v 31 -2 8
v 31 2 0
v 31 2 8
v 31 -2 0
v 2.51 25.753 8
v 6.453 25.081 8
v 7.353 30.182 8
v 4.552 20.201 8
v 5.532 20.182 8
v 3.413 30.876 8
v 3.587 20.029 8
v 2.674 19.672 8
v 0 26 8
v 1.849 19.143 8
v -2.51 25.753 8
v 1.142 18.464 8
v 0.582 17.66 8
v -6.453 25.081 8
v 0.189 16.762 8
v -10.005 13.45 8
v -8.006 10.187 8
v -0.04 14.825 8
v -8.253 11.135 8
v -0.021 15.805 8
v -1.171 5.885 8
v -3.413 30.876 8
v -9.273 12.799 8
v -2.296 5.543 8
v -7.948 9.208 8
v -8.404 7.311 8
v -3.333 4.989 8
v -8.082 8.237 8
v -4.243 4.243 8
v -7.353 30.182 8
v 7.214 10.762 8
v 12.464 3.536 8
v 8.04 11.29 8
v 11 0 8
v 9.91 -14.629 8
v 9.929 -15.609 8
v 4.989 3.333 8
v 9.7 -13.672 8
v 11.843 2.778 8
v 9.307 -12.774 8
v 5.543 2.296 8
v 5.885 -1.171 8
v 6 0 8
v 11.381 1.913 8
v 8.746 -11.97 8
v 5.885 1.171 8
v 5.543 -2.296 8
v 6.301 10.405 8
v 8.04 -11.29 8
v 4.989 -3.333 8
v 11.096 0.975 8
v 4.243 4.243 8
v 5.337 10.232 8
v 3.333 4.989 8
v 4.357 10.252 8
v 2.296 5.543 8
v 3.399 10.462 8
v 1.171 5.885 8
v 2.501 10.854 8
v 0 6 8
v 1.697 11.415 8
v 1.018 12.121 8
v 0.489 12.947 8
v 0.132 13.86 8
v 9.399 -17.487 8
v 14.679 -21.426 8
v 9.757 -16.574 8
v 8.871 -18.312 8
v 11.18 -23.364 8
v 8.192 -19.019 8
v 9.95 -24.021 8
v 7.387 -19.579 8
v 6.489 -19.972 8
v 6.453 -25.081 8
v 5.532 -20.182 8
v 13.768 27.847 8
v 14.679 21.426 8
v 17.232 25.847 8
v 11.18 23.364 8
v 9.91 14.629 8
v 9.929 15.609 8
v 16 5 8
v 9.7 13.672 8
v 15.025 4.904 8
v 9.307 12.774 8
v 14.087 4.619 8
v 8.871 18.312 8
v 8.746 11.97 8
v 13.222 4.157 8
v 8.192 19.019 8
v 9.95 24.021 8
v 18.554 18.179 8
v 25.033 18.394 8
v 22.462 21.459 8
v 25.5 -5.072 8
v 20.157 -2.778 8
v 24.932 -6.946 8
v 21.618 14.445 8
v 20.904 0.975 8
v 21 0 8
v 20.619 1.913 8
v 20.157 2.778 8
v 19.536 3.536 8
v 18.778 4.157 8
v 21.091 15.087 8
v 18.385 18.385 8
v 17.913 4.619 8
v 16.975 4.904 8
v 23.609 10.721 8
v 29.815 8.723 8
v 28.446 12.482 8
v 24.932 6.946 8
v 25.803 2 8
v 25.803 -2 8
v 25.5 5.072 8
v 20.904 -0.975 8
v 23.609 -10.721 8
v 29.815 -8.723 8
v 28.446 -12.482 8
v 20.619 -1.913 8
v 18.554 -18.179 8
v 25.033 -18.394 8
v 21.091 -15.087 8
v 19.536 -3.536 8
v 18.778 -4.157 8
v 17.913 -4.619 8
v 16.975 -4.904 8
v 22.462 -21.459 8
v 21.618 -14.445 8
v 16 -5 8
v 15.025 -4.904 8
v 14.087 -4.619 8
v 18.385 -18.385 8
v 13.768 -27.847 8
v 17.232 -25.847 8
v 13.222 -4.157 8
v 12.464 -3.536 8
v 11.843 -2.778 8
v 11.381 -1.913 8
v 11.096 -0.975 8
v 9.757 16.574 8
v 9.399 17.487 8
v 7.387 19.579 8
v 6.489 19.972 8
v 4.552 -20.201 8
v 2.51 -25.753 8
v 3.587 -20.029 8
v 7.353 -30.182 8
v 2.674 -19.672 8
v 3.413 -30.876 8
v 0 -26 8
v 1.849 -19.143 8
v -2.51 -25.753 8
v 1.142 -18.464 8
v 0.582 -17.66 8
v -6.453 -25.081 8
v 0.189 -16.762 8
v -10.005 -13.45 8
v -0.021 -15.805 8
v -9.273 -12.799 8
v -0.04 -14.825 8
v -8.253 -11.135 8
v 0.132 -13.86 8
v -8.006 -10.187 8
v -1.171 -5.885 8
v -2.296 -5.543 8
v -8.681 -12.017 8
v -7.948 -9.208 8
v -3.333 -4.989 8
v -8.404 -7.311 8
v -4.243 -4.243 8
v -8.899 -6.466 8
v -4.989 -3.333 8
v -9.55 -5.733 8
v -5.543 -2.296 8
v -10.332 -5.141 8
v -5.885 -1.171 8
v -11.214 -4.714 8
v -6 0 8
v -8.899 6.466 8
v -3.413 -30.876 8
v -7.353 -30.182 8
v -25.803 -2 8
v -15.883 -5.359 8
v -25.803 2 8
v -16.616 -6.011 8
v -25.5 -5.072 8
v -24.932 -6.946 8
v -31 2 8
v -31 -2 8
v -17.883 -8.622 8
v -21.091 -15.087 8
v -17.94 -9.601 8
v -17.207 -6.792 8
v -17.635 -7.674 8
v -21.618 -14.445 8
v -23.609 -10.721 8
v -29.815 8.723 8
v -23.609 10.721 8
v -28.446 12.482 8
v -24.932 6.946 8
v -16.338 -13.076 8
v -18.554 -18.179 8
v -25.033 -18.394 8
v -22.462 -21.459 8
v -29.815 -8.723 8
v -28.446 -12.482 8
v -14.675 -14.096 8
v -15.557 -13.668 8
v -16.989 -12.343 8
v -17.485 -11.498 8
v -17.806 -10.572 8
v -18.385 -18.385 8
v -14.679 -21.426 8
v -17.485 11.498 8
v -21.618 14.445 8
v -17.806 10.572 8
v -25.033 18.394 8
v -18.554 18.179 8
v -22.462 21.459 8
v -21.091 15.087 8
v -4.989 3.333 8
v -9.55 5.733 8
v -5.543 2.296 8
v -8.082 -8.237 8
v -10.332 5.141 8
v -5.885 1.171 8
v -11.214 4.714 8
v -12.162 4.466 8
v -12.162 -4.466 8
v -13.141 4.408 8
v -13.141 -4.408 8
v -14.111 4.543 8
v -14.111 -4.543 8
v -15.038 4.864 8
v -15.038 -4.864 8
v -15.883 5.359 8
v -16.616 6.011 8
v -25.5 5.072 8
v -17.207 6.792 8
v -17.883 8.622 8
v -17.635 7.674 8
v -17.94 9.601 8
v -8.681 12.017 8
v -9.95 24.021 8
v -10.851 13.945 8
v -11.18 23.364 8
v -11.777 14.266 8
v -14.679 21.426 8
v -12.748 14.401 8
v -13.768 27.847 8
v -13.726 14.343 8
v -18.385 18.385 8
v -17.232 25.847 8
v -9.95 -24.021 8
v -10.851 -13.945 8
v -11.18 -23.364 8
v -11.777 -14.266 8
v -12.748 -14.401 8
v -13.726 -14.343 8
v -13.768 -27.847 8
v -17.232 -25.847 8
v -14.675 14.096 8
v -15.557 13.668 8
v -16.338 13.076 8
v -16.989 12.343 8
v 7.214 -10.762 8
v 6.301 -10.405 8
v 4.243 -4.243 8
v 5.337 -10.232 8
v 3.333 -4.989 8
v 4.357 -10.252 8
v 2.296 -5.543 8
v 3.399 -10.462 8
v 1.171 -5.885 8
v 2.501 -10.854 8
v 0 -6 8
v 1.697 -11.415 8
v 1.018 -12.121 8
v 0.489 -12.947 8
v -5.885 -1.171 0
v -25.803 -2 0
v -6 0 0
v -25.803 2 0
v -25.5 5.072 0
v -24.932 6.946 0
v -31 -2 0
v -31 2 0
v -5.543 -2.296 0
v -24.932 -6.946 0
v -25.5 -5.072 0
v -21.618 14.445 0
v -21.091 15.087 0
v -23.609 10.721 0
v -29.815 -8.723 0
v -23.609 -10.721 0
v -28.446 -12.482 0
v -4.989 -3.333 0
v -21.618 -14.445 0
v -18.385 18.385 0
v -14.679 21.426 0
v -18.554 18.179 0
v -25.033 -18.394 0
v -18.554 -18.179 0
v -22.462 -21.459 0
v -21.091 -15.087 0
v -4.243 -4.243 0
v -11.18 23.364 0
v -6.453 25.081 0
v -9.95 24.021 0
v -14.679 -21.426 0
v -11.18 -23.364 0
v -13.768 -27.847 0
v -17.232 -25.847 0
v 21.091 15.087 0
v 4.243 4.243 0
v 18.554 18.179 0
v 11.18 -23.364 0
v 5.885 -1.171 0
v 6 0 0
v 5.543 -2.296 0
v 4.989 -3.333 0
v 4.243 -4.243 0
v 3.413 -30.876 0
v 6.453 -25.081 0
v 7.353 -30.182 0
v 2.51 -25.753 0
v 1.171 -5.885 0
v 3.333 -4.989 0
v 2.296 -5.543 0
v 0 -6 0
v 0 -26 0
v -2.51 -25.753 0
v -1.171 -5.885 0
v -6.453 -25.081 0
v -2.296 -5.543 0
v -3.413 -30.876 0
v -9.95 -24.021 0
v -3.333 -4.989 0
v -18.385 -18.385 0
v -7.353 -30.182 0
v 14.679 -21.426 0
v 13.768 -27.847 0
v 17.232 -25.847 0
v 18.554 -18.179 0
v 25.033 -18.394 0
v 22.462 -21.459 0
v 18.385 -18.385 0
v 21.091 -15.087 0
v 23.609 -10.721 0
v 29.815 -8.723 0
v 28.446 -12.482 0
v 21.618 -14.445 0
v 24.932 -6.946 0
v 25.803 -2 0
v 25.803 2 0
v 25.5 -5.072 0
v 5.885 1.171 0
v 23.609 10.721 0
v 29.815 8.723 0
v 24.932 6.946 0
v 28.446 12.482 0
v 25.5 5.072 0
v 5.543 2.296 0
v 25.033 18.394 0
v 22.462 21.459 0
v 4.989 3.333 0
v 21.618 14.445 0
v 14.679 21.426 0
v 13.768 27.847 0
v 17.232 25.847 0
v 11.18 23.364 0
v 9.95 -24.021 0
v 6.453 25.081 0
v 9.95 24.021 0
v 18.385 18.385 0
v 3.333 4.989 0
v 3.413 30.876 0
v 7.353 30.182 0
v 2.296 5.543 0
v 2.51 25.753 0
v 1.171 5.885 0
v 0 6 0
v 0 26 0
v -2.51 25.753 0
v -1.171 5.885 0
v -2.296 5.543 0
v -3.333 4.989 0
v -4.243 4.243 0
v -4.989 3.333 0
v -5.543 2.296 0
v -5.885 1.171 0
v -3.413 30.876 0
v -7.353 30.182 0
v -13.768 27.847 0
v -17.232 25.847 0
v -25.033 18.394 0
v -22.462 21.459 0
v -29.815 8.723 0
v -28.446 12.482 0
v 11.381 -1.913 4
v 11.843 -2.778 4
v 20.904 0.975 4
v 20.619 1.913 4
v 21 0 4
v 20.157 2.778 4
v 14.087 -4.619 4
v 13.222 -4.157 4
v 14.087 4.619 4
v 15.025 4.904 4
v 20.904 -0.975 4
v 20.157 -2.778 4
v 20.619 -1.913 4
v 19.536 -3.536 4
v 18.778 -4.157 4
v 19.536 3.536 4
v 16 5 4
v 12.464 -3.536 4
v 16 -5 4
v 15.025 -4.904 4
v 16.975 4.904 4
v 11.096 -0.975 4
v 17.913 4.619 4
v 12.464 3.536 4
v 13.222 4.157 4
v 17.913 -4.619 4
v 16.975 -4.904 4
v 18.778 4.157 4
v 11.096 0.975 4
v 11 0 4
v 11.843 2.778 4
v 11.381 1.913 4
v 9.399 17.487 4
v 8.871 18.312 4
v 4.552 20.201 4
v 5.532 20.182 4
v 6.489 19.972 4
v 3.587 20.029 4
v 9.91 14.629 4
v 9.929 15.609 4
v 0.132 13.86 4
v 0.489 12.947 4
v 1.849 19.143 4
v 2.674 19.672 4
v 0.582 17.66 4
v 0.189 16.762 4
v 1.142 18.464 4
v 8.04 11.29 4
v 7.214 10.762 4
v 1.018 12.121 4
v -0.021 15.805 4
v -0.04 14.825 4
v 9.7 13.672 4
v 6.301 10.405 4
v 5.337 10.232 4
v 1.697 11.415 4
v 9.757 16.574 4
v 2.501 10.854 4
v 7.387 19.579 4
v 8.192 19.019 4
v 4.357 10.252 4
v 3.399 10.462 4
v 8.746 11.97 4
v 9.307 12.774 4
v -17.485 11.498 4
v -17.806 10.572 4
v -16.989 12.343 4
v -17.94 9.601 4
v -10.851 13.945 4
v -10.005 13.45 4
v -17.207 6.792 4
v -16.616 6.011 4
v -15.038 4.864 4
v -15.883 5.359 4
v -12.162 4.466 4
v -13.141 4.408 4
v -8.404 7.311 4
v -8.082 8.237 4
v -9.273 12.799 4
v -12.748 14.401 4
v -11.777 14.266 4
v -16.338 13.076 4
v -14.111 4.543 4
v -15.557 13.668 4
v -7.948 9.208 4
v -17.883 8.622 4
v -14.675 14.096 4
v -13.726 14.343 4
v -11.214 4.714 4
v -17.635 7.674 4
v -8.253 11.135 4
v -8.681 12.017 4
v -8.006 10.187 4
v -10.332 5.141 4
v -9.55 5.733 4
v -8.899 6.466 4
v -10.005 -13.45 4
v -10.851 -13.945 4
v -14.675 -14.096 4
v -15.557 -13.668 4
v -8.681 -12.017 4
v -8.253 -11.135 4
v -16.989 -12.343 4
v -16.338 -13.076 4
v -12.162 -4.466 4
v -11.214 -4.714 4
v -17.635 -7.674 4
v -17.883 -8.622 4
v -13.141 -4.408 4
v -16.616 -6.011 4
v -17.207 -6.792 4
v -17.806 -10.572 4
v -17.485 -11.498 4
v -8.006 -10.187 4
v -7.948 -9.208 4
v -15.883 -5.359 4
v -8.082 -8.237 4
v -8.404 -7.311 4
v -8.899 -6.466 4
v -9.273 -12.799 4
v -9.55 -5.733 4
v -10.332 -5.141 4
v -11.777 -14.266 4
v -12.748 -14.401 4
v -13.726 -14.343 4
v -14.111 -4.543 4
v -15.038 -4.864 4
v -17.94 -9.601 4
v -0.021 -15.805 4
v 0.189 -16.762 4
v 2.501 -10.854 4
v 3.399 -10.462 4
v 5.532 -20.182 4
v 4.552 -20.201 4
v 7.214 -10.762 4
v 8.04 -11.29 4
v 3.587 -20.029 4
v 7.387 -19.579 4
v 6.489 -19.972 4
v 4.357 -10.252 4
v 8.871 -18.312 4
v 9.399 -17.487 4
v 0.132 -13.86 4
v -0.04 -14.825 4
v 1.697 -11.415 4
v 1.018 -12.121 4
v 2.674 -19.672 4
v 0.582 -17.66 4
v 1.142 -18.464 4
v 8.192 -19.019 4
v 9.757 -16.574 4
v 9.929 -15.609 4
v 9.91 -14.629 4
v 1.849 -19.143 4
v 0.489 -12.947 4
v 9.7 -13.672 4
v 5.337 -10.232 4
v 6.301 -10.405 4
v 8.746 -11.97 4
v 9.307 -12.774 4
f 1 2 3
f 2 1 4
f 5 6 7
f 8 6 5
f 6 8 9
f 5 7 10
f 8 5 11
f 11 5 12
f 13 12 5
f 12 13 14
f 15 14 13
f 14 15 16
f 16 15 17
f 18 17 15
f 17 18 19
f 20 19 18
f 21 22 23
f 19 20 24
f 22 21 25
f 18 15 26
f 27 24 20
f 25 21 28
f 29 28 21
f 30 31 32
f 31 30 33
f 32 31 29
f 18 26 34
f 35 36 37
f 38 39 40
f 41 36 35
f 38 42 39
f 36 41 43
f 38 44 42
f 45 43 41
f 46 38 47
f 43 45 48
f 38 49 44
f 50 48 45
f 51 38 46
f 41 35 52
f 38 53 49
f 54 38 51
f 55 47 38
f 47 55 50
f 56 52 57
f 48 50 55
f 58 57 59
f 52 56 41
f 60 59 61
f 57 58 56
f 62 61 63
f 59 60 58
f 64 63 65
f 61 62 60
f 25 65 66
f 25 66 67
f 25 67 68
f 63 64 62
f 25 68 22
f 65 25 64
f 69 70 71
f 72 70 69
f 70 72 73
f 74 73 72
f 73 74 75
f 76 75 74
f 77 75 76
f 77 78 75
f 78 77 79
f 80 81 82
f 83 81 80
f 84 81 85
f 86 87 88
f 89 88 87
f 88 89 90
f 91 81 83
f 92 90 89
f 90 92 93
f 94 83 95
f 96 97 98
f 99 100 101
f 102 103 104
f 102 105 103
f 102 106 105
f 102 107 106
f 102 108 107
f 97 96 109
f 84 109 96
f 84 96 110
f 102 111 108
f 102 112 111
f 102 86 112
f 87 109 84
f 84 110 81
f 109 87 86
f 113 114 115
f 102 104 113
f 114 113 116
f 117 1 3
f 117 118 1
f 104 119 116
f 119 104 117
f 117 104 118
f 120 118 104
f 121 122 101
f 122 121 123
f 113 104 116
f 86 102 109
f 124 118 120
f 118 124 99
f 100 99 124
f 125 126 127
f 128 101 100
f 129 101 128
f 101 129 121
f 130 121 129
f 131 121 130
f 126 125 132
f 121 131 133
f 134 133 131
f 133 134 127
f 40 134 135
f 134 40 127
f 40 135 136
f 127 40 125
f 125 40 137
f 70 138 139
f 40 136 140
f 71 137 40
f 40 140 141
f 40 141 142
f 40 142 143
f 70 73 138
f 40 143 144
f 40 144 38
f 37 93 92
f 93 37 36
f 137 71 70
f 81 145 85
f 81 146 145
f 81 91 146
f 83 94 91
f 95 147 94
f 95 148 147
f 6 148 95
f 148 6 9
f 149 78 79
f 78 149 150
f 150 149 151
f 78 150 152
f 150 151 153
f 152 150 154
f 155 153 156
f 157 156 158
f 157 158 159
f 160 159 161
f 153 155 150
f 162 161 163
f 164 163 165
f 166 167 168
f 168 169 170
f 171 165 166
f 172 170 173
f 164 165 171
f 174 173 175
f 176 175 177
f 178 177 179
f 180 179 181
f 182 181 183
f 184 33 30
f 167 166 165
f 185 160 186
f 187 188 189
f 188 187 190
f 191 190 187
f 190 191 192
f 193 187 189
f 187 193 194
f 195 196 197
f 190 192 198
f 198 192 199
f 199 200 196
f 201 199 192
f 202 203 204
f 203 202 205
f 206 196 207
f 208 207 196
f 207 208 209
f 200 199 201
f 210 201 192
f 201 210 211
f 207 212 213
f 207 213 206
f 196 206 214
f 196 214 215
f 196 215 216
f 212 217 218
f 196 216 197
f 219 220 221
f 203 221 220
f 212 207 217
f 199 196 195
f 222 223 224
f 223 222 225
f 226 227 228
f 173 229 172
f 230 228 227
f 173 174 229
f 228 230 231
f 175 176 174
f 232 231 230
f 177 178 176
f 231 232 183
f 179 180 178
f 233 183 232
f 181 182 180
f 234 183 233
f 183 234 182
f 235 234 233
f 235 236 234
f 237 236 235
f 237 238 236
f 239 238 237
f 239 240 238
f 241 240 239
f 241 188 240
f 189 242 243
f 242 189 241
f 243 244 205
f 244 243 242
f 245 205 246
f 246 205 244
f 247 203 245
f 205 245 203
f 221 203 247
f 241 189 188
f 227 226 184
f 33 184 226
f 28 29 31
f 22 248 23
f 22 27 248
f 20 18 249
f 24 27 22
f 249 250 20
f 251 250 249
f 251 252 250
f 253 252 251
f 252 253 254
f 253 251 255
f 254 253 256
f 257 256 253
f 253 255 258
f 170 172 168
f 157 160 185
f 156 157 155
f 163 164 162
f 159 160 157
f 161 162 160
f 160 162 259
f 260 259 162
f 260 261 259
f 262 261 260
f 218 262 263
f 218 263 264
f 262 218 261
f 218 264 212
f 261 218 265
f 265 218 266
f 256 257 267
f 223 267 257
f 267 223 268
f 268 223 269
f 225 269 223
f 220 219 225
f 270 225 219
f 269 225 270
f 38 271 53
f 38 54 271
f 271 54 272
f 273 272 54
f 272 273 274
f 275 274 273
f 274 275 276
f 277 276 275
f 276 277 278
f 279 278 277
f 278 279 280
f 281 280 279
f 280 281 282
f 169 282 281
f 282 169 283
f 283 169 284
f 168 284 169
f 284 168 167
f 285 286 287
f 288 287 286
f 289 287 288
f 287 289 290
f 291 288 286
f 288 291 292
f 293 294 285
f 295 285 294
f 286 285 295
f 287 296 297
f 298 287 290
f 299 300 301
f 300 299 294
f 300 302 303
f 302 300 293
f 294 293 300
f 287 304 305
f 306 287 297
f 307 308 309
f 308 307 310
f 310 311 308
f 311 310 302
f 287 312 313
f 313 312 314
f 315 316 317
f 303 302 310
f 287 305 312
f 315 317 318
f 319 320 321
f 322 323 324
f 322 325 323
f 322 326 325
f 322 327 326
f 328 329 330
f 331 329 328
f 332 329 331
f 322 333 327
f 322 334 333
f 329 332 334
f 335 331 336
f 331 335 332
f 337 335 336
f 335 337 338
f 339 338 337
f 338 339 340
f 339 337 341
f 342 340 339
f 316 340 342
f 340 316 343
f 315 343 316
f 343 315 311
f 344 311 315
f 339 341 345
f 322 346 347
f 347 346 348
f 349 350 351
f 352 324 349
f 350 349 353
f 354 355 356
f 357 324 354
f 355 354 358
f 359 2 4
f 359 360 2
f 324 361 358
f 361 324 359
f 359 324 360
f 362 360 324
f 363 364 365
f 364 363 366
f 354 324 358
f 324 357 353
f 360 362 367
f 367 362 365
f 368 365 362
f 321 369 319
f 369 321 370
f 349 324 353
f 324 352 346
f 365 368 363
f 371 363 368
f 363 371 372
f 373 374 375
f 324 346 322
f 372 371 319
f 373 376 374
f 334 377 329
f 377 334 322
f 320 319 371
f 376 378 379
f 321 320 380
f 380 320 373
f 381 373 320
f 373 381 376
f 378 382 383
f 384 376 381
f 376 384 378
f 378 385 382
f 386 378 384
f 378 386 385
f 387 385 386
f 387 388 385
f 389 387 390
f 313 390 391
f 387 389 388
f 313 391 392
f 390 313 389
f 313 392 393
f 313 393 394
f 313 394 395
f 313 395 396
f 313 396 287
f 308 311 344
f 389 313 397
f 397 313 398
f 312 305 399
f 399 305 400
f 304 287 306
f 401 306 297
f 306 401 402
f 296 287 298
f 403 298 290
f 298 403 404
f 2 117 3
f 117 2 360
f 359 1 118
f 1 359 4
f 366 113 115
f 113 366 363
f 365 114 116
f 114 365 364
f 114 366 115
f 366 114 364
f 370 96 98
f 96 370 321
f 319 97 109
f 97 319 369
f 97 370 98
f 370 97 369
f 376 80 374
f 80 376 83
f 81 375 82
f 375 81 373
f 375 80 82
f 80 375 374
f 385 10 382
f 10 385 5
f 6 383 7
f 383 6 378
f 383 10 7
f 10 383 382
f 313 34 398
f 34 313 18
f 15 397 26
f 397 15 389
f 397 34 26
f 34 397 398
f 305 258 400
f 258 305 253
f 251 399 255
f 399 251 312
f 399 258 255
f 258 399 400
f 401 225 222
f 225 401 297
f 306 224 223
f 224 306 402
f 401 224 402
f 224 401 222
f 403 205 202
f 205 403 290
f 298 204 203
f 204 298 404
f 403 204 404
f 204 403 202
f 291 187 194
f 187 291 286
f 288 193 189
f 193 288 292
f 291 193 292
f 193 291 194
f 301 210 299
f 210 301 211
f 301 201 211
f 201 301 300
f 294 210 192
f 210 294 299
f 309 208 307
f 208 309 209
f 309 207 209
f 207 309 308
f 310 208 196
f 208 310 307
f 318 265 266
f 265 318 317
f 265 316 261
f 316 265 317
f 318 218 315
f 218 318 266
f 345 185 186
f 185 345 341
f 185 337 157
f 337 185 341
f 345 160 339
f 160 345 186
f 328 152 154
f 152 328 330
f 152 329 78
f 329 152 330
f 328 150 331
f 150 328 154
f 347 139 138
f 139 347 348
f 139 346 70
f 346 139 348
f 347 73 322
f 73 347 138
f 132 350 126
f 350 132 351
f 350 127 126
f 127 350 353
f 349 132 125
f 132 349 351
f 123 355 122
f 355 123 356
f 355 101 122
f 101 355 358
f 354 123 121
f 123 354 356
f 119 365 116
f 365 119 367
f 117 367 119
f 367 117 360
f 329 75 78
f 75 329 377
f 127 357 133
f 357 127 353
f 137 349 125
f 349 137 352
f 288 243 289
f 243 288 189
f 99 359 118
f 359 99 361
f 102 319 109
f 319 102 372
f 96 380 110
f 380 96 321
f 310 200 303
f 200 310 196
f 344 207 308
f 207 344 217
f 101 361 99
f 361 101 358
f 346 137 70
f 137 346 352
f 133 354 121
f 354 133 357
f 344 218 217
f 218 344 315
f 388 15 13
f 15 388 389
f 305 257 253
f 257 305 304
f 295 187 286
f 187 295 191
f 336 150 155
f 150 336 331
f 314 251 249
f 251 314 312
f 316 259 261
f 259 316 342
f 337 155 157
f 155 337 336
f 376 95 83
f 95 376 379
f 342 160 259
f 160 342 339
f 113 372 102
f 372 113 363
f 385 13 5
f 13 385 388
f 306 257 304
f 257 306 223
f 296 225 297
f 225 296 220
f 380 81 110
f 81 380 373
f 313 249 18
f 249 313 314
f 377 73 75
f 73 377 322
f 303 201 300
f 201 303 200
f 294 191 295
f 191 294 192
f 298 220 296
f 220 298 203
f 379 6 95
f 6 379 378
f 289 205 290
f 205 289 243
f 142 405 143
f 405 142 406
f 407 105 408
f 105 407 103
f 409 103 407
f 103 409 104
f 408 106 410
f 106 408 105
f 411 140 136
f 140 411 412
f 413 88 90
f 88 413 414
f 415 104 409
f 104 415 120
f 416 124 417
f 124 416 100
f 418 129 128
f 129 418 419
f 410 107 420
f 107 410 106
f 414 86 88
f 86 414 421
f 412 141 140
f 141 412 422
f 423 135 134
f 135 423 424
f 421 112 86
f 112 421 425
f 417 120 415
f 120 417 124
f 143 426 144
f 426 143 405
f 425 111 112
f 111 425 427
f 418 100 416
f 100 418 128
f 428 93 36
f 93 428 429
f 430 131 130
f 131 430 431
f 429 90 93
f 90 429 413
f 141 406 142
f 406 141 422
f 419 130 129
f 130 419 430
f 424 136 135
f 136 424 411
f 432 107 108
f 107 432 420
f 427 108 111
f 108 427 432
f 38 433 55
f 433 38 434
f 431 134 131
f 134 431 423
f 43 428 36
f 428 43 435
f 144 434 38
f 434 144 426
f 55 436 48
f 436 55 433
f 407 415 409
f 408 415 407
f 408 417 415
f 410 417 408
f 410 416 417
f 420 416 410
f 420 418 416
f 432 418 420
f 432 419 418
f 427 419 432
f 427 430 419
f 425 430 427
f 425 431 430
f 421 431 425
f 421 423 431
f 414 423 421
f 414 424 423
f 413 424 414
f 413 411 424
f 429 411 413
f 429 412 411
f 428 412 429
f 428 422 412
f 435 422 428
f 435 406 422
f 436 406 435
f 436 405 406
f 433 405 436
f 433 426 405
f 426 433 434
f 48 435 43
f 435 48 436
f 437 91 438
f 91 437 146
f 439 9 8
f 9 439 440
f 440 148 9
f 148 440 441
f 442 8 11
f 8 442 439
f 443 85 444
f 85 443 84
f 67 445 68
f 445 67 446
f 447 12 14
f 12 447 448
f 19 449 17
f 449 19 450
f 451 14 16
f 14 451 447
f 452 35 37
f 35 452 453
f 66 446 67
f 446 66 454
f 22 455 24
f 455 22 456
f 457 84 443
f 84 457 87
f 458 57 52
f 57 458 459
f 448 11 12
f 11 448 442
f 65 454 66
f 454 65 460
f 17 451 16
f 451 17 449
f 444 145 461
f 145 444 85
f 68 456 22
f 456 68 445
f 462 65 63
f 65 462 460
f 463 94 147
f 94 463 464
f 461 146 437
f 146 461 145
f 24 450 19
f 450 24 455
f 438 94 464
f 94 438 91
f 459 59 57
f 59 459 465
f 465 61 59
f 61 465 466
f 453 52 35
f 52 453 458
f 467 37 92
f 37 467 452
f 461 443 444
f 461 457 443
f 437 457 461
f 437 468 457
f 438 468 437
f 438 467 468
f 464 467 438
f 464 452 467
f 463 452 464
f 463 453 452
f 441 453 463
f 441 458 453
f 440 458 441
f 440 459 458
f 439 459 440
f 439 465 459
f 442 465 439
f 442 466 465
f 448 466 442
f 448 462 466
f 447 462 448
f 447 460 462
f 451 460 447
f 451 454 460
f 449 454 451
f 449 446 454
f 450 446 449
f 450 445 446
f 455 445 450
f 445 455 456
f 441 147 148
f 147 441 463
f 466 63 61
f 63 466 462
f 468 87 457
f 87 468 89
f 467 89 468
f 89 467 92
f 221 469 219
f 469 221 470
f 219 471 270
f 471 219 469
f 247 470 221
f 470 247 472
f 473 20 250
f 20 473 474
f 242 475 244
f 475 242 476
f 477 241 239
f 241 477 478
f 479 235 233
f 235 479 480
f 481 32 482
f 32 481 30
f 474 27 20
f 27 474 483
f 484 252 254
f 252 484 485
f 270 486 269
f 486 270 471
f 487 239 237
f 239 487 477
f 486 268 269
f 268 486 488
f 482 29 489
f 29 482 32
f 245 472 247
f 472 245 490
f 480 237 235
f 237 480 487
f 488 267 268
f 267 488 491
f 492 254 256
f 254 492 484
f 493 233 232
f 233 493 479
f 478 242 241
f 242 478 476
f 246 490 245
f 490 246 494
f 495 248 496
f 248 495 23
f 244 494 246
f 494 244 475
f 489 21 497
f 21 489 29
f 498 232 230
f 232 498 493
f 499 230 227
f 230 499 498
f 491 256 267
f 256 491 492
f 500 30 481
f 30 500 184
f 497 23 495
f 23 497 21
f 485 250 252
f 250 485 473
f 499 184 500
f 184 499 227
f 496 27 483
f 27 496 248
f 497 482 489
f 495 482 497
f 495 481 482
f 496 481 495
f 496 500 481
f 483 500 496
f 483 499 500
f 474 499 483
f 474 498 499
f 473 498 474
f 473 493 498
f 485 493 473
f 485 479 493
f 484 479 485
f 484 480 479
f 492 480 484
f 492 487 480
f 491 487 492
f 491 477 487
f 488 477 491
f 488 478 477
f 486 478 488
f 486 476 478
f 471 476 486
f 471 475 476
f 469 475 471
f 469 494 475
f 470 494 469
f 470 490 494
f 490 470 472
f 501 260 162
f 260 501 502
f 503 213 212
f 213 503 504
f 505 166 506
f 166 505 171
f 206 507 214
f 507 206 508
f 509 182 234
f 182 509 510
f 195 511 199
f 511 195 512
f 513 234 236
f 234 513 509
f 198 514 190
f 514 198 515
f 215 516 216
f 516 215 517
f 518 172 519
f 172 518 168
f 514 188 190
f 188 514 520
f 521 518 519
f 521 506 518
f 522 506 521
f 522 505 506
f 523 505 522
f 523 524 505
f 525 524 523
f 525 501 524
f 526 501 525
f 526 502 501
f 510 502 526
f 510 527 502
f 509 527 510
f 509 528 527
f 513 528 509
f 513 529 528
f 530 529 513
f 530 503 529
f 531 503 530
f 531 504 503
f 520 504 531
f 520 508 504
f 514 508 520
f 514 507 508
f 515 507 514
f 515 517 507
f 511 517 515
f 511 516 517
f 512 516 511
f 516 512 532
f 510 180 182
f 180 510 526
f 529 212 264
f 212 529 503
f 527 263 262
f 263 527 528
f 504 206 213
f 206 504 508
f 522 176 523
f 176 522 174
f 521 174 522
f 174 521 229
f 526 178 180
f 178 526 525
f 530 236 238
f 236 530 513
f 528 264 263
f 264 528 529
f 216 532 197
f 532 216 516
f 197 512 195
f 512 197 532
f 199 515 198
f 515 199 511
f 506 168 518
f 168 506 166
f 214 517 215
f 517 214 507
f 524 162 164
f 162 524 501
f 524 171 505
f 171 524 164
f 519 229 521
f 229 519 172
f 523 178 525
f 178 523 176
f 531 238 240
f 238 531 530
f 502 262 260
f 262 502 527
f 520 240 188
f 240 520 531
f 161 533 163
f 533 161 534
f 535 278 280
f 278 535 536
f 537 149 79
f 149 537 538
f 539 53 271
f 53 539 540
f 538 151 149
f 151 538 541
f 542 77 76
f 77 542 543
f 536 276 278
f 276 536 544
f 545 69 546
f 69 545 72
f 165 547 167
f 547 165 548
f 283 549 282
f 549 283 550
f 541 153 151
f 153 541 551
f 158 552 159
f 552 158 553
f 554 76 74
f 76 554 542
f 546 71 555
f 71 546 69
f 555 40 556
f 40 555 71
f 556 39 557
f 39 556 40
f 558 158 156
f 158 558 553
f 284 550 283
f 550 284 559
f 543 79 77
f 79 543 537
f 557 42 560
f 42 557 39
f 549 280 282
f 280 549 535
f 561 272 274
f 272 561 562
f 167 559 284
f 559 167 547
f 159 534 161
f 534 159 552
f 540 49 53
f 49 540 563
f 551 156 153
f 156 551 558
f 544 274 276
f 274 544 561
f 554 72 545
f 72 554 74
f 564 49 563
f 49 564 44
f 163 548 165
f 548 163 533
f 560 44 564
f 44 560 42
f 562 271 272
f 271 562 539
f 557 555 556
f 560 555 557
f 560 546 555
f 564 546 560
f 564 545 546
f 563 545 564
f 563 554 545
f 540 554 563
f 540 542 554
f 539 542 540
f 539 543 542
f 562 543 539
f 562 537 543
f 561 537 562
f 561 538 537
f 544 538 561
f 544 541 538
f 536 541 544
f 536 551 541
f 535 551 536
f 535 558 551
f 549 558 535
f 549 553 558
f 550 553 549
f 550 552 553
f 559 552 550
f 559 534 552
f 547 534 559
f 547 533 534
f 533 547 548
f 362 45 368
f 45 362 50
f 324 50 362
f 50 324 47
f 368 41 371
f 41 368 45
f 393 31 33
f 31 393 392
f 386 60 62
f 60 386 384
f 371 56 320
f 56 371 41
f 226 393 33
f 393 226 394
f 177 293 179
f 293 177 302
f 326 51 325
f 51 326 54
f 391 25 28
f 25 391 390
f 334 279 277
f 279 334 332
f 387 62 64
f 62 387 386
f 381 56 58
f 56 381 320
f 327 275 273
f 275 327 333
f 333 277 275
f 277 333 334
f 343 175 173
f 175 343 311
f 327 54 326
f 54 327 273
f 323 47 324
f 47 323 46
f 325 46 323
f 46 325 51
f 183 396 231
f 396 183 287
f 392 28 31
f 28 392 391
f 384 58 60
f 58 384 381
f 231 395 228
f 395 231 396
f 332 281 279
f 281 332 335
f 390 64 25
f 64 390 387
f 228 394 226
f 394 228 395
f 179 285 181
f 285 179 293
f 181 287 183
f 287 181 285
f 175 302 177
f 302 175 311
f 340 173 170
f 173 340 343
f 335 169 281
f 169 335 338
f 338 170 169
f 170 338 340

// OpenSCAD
$fn = 32;

// ----------------------------------------------------------------------
// Spur blank: lightened gear blank
// ----------------------------------------------------------------------

// --- parameters (mm) ---
disc_r = 26;              // blank root radius
disc_t = 8;               // blank thickness
n_teeth = 18;             // stub tooth count
tooth_w = 4;              // tooth width at the root
tooth_h = 5;              // tooth height above the root
bore_r = 6;               // central bore radius
ring_r = 16;              // lightening pocket ring radius
pocket_r = 5;             // lightening pocket radius
fit_tol = 0.02;           // tolerance for press fits, mm
free_tol = 0.2;           // tolerance for clearance fits, mm

out_r = disc_r + tooth_h;  // tip radius
bbox_x = 62.0;  // measured width over the teeth
bbox_y = 61.75;  // measured depth over the teeth

difference() {
union() {
  cylinder(r = disc_r, h = disc_t);
  for (i = [0 : n_teeth - 1])
    rotate([0, 0, i * 360 / n_teeth])
      translate([disc_r - 1, -tooth_w / 2, 0])
        cube([tooth_h + 1, tooth_w, disc_t]);
}
  translate([0, 0, -1]) cylinder(r = bore_r, h = disc_t + 2);
  for (i = [0 : 5])
    rotate([0, 0, i * 72])
      translate([ring_r, 0, disc_t - 4])
        cylinder(r = pocket_r, h = 5);
}
